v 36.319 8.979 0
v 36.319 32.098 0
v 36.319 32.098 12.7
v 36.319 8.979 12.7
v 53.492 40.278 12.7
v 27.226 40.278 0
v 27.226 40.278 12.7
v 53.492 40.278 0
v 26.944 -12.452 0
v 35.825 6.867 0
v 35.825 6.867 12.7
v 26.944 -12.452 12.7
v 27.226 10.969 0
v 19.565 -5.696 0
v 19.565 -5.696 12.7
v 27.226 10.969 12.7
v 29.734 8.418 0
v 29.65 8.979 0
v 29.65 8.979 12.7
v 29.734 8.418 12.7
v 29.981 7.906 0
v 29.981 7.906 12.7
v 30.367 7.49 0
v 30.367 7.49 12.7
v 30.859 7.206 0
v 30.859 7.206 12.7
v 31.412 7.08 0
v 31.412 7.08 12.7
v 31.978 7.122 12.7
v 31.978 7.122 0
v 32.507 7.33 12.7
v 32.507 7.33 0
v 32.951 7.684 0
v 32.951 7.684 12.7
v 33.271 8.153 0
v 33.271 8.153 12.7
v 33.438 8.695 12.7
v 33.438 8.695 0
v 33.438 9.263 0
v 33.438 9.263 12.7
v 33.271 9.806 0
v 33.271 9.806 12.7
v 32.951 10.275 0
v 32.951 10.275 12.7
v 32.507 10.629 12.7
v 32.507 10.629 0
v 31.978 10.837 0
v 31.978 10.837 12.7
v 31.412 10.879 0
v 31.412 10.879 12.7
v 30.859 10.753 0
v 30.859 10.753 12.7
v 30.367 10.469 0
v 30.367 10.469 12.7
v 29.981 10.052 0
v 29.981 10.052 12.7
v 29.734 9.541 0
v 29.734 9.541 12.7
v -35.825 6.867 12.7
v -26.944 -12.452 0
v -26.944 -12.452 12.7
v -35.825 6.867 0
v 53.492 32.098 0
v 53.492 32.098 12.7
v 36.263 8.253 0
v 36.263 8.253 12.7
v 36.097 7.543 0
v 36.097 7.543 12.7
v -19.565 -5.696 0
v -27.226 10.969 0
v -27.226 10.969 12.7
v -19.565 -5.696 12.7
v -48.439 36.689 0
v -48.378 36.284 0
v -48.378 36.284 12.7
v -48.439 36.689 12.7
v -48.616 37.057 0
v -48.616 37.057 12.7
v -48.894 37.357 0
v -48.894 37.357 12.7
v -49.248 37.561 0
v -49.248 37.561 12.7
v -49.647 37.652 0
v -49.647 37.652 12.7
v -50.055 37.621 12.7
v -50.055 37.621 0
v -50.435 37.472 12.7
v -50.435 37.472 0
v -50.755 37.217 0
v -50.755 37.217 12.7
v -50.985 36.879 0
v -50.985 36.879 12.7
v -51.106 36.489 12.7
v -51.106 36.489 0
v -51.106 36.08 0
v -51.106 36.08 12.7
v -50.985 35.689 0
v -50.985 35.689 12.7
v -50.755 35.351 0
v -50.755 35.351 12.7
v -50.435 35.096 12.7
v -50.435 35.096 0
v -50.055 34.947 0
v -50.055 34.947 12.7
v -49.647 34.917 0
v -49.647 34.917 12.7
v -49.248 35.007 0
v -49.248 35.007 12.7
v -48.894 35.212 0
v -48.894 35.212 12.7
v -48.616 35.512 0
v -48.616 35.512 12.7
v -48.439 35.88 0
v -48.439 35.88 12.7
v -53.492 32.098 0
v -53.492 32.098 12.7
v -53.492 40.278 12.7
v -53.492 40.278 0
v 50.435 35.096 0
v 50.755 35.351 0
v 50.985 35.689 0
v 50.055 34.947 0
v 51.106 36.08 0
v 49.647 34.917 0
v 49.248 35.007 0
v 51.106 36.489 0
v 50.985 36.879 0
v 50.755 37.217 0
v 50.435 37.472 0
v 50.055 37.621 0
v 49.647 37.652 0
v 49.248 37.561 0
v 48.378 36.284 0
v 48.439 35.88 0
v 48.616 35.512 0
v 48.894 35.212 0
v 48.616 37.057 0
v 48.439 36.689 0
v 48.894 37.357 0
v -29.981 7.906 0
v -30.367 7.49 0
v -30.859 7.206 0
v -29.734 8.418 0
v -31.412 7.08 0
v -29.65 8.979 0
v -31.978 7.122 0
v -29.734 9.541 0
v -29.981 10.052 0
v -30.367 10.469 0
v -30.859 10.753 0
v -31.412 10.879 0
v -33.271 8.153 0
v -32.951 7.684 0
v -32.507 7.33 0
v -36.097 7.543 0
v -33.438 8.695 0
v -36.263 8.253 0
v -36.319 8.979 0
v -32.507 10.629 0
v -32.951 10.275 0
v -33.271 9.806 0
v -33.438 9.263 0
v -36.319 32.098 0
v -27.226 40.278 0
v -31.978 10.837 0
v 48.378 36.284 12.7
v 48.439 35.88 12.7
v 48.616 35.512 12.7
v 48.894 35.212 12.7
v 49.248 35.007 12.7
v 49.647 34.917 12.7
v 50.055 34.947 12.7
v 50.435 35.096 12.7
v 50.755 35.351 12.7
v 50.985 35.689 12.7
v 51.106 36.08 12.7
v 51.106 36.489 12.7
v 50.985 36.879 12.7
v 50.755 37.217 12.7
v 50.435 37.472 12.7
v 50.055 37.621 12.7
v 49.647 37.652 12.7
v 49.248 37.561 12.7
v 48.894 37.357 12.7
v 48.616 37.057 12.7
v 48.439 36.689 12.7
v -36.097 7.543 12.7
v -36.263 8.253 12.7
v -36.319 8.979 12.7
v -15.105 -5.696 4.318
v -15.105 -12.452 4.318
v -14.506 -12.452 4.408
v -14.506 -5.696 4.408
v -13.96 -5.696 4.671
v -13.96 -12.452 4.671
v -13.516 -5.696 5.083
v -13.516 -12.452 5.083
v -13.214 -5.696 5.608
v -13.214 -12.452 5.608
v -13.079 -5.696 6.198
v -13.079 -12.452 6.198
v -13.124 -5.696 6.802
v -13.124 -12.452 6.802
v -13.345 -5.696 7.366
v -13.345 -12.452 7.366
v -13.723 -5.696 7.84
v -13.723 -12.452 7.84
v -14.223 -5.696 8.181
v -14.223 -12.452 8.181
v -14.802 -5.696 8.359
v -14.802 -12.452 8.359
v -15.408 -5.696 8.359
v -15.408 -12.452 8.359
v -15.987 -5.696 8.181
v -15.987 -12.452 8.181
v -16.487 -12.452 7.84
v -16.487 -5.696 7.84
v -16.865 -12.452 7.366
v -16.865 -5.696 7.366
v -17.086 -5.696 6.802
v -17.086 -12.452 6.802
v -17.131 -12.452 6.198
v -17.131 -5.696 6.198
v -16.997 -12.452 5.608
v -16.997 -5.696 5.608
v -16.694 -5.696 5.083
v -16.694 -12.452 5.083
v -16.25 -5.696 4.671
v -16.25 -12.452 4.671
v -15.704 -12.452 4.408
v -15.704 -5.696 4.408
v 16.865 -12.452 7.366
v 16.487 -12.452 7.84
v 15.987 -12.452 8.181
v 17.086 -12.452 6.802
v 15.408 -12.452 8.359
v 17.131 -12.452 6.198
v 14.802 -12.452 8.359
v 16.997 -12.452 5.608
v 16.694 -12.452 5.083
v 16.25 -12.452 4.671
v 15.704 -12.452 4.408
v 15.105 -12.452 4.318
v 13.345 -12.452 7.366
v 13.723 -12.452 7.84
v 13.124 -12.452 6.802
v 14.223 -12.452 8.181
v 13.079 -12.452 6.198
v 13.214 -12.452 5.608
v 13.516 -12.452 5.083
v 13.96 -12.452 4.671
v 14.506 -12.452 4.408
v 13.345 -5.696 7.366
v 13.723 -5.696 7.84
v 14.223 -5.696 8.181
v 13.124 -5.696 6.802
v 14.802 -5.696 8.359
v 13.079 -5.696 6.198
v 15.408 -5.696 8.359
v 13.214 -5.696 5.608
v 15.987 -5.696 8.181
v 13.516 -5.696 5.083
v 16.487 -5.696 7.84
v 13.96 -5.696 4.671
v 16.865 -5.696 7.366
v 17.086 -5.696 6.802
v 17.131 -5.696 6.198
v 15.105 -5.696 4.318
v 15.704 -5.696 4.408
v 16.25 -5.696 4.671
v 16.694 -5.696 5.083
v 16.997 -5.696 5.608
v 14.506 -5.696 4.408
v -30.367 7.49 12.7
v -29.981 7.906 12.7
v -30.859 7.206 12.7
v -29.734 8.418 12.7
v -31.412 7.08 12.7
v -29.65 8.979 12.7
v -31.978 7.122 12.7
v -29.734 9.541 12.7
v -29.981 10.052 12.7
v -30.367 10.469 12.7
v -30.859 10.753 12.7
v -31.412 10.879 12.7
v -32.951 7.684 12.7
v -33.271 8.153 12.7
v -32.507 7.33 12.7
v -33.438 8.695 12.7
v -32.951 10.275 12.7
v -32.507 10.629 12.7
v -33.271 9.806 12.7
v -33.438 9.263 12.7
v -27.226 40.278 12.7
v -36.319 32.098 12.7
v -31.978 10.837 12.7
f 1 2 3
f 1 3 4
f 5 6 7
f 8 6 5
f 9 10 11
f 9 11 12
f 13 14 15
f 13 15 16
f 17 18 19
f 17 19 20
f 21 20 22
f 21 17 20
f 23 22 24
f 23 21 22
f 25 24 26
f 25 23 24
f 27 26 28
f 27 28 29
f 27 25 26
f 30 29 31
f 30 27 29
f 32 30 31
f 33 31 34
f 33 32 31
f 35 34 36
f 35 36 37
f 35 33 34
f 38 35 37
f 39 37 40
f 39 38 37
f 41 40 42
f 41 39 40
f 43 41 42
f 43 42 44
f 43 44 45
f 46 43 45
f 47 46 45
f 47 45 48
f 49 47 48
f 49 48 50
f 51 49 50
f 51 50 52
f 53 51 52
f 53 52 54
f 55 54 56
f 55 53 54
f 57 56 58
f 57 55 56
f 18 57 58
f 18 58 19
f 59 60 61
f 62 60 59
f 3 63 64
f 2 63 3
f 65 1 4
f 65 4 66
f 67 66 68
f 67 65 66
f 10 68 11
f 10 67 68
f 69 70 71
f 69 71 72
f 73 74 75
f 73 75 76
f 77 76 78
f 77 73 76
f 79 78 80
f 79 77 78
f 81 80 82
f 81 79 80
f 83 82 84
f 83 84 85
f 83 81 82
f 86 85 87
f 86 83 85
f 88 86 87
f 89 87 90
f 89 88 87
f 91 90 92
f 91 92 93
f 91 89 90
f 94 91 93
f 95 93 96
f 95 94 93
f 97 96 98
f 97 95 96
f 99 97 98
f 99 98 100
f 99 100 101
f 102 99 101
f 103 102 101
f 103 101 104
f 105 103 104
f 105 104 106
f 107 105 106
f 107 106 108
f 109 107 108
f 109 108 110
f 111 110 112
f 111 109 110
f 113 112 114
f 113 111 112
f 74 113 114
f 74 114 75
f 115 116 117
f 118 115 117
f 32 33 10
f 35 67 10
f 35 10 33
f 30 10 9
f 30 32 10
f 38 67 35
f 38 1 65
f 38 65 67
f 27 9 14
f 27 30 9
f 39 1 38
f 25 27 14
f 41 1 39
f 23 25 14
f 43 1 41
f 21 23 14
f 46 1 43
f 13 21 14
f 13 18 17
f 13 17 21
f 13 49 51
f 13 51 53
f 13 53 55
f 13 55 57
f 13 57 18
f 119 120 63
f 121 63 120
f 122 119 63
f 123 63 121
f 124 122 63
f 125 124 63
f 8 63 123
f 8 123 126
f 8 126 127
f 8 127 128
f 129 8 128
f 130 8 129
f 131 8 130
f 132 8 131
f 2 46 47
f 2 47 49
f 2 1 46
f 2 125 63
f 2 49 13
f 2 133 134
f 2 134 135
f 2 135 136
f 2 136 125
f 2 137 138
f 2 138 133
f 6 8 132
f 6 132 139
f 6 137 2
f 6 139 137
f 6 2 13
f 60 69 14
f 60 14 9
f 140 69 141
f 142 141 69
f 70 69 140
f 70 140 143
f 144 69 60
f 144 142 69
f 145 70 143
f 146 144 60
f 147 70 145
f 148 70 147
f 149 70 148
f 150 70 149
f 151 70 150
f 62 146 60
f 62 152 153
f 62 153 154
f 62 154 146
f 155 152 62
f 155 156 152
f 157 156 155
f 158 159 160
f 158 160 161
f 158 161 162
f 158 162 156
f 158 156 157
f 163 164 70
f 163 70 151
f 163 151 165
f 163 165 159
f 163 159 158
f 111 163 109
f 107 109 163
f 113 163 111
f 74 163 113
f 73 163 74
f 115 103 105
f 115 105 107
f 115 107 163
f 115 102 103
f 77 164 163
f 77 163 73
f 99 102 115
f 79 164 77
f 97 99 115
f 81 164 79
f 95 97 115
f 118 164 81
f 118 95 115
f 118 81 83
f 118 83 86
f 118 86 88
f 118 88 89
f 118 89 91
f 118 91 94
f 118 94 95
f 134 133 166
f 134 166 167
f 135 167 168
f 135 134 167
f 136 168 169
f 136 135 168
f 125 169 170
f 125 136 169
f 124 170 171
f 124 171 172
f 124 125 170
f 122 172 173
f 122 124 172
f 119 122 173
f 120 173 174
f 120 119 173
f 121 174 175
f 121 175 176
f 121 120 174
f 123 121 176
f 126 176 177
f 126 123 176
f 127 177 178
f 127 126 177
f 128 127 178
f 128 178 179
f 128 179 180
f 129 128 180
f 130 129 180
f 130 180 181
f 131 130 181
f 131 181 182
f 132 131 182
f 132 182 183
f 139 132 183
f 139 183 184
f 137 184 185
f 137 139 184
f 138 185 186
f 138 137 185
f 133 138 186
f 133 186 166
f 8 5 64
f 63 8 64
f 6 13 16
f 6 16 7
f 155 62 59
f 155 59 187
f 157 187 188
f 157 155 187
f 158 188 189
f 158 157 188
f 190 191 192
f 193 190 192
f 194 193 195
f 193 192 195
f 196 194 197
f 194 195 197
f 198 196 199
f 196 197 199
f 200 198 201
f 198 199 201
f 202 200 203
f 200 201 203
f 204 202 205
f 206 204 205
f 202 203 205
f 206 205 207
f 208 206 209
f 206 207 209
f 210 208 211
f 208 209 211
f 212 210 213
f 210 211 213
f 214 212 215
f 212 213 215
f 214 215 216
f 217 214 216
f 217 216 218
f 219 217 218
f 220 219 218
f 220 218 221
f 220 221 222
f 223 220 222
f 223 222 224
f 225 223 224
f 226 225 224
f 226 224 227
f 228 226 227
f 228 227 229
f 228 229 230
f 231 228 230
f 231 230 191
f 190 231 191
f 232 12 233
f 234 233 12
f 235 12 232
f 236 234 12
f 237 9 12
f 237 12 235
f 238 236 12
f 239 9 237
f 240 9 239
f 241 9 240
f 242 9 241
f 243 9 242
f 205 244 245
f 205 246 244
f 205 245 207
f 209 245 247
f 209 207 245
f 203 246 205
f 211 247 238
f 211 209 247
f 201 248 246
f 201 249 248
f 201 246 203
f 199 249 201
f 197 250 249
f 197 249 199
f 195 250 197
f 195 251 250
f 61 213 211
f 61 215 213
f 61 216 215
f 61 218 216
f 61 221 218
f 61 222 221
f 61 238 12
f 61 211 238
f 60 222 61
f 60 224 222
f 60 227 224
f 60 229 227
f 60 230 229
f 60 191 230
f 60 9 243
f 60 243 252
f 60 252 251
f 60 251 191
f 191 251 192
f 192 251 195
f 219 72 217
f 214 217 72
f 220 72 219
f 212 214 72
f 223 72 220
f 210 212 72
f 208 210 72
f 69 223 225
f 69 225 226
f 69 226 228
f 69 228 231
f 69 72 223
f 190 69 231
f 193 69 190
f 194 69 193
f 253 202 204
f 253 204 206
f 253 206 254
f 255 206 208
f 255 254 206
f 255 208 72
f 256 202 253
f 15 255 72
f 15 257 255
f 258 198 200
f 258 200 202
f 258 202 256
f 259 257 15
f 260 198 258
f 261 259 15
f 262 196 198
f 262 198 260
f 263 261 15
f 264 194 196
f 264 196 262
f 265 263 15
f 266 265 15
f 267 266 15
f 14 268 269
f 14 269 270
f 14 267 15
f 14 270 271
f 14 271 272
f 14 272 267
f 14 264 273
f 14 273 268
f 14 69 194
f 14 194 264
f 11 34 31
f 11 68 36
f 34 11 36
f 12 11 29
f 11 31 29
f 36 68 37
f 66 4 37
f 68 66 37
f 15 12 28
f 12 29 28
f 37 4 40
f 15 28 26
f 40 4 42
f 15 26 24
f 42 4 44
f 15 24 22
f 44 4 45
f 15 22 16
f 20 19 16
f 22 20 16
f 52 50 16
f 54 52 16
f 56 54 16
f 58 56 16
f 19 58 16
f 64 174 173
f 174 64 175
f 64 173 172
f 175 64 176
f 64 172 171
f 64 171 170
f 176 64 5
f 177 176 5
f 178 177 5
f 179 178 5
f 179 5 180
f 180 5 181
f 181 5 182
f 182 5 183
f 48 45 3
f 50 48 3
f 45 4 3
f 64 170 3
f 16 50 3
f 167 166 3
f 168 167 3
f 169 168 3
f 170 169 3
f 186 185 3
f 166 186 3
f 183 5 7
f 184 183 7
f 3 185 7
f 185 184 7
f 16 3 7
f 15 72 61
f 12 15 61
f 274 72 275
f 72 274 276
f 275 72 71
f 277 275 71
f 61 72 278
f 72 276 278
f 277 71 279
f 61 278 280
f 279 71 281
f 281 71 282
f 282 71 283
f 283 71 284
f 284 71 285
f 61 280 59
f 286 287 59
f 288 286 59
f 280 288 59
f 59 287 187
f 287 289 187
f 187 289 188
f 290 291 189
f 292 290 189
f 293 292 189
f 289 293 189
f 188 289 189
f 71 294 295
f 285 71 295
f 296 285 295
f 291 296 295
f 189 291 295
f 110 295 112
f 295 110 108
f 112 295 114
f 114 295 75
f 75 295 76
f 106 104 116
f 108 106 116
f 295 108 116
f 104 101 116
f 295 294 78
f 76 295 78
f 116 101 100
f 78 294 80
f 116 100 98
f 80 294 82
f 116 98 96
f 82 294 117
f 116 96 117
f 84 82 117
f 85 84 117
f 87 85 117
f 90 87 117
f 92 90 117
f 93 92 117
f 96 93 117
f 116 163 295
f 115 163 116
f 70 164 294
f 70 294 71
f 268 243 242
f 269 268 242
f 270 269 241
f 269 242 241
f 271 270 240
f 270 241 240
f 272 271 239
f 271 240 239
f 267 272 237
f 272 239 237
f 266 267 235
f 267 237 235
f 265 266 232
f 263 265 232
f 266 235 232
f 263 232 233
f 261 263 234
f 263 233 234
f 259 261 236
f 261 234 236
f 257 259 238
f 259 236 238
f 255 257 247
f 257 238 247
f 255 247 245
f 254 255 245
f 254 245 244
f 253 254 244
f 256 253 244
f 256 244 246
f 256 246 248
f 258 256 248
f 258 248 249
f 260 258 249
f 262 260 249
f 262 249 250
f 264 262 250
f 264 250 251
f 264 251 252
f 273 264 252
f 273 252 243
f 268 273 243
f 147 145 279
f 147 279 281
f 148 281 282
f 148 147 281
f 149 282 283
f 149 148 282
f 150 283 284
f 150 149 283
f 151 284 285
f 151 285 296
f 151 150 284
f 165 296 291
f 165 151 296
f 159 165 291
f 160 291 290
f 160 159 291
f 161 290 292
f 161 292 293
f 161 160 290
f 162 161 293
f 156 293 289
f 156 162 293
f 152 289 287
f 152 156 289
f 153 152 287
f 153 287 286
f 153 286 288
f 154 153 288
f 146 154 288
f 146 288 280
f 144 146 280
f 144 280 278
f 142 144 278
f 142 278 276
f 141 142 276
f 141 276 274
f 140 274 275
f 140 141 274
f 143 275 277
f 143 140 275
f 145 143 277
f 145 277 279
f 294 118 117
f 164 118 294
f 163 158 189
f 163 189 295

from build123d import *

# Parameters (mm, degrees)
SKETCH1_R      = 1.3716
SKETCH1_R_2    = 1.905
EXTRUDE1_DEPTH = 12.7
SKETCH2_R      = 2.032
EXTRUDE2_DEPTH = 9.652


with BuildPart() as part:
    # Sketch1 → Extrude1 (new body)
    with BuildSketch(Plane.XY):
        with BuildLine():
            Line((-27.225769594, 10.969260914), (-19.564927608, -5.695593273))
            Line((-19.564927608, -5.695593273), (19.564927608, -5.695593273))
            Line((19.564927608, -5.695593273), (27.225769594, 10.969260914))
            Line((27.225769594, 10.969260914), (27.225769594, 40.278404046))
            Line((27.225769594, 40.278404046), (53.492478146, 40.278404046))
            Line((53.492478146, 40.278404046), (53.492478146, 32.09814334))
            Line((53.492478146, 32.09814334), (36.318856593, 32.09814334))
            Line((36.318856593, 32.09814334), (36.318856593, 8.979309022))
            ThreePointArc((36.318856593, 8.979309022), (36.193812026, 7.894938195), (35.825242223, 6.867488665))
            Line((35.825242223, 6.867488665), (26.944030552, -12.452071481))
            Line((26.944030552, -12.452071481), (-26.944030552, -12.452071481))
            Line((-26.944030552, -12.452071481), (-35.825242223, 6.867488665))
            ThreePointArc((-35.825242223, 6.867488665), (-36.193812026, 7.894938195), (-36.318856593, 8.979309022))
            Line((-36.318856593, 8.979309022), (-36.318856593, 32.09814334))
            Line((-36.318856593, 32.09814334), (-53.492478146, 32.09814334))
            Line((-53.492478146, 32.09814334), (-53.492478146, 40.278404046))
            Line((-53.492478146, 40.278404046), (-27.225769594, 40.278404046))
            Line((-27.225769594, 40.278404046), (-27.225769594, 10.969260914))
        make_face()
        with Locations((-49.749305957, 36.28427137)):
            Circle(SKETCH1_R, mode=Mode.SUBTRACT)
        with Locations(Location((49.749305957, 36.28427137, 0), (0, 0, 180))):
            Circle(SKETCH1_R, mode=Mode.SUBTRACT)
        with Locations(Location((31.554570289, 8.979309022, 0), (0, 0, 180))):
            Circle(SKETCH1_R_2, mode=Mode.SUBTRACT)
        with Locations((-31.554570289, 8.979309022)):
            Circle(SKETCH1_R_2, mode=Mode.SUBTRACT)
    extrude(amount=EXTRUDE1_DEPTH)

    # Sketch2 → Extrude2 (cut)
    with BuildSketch(Plane.XZ.offset(12.452071481)):
        with Locations(Location((15.105130103, 6.35, 0), (0, 0, 270))):
            Circle(SKETCH2_R)
        with Locations(Location((-15.105130103, 6.35, 0), (0, 0, 270))):
            Circle(SKETCH2_R)
    extrude(amount=-EXTRUDE2_DEPTH, mode=Mode.SUBTRACT)


solid = part.part
